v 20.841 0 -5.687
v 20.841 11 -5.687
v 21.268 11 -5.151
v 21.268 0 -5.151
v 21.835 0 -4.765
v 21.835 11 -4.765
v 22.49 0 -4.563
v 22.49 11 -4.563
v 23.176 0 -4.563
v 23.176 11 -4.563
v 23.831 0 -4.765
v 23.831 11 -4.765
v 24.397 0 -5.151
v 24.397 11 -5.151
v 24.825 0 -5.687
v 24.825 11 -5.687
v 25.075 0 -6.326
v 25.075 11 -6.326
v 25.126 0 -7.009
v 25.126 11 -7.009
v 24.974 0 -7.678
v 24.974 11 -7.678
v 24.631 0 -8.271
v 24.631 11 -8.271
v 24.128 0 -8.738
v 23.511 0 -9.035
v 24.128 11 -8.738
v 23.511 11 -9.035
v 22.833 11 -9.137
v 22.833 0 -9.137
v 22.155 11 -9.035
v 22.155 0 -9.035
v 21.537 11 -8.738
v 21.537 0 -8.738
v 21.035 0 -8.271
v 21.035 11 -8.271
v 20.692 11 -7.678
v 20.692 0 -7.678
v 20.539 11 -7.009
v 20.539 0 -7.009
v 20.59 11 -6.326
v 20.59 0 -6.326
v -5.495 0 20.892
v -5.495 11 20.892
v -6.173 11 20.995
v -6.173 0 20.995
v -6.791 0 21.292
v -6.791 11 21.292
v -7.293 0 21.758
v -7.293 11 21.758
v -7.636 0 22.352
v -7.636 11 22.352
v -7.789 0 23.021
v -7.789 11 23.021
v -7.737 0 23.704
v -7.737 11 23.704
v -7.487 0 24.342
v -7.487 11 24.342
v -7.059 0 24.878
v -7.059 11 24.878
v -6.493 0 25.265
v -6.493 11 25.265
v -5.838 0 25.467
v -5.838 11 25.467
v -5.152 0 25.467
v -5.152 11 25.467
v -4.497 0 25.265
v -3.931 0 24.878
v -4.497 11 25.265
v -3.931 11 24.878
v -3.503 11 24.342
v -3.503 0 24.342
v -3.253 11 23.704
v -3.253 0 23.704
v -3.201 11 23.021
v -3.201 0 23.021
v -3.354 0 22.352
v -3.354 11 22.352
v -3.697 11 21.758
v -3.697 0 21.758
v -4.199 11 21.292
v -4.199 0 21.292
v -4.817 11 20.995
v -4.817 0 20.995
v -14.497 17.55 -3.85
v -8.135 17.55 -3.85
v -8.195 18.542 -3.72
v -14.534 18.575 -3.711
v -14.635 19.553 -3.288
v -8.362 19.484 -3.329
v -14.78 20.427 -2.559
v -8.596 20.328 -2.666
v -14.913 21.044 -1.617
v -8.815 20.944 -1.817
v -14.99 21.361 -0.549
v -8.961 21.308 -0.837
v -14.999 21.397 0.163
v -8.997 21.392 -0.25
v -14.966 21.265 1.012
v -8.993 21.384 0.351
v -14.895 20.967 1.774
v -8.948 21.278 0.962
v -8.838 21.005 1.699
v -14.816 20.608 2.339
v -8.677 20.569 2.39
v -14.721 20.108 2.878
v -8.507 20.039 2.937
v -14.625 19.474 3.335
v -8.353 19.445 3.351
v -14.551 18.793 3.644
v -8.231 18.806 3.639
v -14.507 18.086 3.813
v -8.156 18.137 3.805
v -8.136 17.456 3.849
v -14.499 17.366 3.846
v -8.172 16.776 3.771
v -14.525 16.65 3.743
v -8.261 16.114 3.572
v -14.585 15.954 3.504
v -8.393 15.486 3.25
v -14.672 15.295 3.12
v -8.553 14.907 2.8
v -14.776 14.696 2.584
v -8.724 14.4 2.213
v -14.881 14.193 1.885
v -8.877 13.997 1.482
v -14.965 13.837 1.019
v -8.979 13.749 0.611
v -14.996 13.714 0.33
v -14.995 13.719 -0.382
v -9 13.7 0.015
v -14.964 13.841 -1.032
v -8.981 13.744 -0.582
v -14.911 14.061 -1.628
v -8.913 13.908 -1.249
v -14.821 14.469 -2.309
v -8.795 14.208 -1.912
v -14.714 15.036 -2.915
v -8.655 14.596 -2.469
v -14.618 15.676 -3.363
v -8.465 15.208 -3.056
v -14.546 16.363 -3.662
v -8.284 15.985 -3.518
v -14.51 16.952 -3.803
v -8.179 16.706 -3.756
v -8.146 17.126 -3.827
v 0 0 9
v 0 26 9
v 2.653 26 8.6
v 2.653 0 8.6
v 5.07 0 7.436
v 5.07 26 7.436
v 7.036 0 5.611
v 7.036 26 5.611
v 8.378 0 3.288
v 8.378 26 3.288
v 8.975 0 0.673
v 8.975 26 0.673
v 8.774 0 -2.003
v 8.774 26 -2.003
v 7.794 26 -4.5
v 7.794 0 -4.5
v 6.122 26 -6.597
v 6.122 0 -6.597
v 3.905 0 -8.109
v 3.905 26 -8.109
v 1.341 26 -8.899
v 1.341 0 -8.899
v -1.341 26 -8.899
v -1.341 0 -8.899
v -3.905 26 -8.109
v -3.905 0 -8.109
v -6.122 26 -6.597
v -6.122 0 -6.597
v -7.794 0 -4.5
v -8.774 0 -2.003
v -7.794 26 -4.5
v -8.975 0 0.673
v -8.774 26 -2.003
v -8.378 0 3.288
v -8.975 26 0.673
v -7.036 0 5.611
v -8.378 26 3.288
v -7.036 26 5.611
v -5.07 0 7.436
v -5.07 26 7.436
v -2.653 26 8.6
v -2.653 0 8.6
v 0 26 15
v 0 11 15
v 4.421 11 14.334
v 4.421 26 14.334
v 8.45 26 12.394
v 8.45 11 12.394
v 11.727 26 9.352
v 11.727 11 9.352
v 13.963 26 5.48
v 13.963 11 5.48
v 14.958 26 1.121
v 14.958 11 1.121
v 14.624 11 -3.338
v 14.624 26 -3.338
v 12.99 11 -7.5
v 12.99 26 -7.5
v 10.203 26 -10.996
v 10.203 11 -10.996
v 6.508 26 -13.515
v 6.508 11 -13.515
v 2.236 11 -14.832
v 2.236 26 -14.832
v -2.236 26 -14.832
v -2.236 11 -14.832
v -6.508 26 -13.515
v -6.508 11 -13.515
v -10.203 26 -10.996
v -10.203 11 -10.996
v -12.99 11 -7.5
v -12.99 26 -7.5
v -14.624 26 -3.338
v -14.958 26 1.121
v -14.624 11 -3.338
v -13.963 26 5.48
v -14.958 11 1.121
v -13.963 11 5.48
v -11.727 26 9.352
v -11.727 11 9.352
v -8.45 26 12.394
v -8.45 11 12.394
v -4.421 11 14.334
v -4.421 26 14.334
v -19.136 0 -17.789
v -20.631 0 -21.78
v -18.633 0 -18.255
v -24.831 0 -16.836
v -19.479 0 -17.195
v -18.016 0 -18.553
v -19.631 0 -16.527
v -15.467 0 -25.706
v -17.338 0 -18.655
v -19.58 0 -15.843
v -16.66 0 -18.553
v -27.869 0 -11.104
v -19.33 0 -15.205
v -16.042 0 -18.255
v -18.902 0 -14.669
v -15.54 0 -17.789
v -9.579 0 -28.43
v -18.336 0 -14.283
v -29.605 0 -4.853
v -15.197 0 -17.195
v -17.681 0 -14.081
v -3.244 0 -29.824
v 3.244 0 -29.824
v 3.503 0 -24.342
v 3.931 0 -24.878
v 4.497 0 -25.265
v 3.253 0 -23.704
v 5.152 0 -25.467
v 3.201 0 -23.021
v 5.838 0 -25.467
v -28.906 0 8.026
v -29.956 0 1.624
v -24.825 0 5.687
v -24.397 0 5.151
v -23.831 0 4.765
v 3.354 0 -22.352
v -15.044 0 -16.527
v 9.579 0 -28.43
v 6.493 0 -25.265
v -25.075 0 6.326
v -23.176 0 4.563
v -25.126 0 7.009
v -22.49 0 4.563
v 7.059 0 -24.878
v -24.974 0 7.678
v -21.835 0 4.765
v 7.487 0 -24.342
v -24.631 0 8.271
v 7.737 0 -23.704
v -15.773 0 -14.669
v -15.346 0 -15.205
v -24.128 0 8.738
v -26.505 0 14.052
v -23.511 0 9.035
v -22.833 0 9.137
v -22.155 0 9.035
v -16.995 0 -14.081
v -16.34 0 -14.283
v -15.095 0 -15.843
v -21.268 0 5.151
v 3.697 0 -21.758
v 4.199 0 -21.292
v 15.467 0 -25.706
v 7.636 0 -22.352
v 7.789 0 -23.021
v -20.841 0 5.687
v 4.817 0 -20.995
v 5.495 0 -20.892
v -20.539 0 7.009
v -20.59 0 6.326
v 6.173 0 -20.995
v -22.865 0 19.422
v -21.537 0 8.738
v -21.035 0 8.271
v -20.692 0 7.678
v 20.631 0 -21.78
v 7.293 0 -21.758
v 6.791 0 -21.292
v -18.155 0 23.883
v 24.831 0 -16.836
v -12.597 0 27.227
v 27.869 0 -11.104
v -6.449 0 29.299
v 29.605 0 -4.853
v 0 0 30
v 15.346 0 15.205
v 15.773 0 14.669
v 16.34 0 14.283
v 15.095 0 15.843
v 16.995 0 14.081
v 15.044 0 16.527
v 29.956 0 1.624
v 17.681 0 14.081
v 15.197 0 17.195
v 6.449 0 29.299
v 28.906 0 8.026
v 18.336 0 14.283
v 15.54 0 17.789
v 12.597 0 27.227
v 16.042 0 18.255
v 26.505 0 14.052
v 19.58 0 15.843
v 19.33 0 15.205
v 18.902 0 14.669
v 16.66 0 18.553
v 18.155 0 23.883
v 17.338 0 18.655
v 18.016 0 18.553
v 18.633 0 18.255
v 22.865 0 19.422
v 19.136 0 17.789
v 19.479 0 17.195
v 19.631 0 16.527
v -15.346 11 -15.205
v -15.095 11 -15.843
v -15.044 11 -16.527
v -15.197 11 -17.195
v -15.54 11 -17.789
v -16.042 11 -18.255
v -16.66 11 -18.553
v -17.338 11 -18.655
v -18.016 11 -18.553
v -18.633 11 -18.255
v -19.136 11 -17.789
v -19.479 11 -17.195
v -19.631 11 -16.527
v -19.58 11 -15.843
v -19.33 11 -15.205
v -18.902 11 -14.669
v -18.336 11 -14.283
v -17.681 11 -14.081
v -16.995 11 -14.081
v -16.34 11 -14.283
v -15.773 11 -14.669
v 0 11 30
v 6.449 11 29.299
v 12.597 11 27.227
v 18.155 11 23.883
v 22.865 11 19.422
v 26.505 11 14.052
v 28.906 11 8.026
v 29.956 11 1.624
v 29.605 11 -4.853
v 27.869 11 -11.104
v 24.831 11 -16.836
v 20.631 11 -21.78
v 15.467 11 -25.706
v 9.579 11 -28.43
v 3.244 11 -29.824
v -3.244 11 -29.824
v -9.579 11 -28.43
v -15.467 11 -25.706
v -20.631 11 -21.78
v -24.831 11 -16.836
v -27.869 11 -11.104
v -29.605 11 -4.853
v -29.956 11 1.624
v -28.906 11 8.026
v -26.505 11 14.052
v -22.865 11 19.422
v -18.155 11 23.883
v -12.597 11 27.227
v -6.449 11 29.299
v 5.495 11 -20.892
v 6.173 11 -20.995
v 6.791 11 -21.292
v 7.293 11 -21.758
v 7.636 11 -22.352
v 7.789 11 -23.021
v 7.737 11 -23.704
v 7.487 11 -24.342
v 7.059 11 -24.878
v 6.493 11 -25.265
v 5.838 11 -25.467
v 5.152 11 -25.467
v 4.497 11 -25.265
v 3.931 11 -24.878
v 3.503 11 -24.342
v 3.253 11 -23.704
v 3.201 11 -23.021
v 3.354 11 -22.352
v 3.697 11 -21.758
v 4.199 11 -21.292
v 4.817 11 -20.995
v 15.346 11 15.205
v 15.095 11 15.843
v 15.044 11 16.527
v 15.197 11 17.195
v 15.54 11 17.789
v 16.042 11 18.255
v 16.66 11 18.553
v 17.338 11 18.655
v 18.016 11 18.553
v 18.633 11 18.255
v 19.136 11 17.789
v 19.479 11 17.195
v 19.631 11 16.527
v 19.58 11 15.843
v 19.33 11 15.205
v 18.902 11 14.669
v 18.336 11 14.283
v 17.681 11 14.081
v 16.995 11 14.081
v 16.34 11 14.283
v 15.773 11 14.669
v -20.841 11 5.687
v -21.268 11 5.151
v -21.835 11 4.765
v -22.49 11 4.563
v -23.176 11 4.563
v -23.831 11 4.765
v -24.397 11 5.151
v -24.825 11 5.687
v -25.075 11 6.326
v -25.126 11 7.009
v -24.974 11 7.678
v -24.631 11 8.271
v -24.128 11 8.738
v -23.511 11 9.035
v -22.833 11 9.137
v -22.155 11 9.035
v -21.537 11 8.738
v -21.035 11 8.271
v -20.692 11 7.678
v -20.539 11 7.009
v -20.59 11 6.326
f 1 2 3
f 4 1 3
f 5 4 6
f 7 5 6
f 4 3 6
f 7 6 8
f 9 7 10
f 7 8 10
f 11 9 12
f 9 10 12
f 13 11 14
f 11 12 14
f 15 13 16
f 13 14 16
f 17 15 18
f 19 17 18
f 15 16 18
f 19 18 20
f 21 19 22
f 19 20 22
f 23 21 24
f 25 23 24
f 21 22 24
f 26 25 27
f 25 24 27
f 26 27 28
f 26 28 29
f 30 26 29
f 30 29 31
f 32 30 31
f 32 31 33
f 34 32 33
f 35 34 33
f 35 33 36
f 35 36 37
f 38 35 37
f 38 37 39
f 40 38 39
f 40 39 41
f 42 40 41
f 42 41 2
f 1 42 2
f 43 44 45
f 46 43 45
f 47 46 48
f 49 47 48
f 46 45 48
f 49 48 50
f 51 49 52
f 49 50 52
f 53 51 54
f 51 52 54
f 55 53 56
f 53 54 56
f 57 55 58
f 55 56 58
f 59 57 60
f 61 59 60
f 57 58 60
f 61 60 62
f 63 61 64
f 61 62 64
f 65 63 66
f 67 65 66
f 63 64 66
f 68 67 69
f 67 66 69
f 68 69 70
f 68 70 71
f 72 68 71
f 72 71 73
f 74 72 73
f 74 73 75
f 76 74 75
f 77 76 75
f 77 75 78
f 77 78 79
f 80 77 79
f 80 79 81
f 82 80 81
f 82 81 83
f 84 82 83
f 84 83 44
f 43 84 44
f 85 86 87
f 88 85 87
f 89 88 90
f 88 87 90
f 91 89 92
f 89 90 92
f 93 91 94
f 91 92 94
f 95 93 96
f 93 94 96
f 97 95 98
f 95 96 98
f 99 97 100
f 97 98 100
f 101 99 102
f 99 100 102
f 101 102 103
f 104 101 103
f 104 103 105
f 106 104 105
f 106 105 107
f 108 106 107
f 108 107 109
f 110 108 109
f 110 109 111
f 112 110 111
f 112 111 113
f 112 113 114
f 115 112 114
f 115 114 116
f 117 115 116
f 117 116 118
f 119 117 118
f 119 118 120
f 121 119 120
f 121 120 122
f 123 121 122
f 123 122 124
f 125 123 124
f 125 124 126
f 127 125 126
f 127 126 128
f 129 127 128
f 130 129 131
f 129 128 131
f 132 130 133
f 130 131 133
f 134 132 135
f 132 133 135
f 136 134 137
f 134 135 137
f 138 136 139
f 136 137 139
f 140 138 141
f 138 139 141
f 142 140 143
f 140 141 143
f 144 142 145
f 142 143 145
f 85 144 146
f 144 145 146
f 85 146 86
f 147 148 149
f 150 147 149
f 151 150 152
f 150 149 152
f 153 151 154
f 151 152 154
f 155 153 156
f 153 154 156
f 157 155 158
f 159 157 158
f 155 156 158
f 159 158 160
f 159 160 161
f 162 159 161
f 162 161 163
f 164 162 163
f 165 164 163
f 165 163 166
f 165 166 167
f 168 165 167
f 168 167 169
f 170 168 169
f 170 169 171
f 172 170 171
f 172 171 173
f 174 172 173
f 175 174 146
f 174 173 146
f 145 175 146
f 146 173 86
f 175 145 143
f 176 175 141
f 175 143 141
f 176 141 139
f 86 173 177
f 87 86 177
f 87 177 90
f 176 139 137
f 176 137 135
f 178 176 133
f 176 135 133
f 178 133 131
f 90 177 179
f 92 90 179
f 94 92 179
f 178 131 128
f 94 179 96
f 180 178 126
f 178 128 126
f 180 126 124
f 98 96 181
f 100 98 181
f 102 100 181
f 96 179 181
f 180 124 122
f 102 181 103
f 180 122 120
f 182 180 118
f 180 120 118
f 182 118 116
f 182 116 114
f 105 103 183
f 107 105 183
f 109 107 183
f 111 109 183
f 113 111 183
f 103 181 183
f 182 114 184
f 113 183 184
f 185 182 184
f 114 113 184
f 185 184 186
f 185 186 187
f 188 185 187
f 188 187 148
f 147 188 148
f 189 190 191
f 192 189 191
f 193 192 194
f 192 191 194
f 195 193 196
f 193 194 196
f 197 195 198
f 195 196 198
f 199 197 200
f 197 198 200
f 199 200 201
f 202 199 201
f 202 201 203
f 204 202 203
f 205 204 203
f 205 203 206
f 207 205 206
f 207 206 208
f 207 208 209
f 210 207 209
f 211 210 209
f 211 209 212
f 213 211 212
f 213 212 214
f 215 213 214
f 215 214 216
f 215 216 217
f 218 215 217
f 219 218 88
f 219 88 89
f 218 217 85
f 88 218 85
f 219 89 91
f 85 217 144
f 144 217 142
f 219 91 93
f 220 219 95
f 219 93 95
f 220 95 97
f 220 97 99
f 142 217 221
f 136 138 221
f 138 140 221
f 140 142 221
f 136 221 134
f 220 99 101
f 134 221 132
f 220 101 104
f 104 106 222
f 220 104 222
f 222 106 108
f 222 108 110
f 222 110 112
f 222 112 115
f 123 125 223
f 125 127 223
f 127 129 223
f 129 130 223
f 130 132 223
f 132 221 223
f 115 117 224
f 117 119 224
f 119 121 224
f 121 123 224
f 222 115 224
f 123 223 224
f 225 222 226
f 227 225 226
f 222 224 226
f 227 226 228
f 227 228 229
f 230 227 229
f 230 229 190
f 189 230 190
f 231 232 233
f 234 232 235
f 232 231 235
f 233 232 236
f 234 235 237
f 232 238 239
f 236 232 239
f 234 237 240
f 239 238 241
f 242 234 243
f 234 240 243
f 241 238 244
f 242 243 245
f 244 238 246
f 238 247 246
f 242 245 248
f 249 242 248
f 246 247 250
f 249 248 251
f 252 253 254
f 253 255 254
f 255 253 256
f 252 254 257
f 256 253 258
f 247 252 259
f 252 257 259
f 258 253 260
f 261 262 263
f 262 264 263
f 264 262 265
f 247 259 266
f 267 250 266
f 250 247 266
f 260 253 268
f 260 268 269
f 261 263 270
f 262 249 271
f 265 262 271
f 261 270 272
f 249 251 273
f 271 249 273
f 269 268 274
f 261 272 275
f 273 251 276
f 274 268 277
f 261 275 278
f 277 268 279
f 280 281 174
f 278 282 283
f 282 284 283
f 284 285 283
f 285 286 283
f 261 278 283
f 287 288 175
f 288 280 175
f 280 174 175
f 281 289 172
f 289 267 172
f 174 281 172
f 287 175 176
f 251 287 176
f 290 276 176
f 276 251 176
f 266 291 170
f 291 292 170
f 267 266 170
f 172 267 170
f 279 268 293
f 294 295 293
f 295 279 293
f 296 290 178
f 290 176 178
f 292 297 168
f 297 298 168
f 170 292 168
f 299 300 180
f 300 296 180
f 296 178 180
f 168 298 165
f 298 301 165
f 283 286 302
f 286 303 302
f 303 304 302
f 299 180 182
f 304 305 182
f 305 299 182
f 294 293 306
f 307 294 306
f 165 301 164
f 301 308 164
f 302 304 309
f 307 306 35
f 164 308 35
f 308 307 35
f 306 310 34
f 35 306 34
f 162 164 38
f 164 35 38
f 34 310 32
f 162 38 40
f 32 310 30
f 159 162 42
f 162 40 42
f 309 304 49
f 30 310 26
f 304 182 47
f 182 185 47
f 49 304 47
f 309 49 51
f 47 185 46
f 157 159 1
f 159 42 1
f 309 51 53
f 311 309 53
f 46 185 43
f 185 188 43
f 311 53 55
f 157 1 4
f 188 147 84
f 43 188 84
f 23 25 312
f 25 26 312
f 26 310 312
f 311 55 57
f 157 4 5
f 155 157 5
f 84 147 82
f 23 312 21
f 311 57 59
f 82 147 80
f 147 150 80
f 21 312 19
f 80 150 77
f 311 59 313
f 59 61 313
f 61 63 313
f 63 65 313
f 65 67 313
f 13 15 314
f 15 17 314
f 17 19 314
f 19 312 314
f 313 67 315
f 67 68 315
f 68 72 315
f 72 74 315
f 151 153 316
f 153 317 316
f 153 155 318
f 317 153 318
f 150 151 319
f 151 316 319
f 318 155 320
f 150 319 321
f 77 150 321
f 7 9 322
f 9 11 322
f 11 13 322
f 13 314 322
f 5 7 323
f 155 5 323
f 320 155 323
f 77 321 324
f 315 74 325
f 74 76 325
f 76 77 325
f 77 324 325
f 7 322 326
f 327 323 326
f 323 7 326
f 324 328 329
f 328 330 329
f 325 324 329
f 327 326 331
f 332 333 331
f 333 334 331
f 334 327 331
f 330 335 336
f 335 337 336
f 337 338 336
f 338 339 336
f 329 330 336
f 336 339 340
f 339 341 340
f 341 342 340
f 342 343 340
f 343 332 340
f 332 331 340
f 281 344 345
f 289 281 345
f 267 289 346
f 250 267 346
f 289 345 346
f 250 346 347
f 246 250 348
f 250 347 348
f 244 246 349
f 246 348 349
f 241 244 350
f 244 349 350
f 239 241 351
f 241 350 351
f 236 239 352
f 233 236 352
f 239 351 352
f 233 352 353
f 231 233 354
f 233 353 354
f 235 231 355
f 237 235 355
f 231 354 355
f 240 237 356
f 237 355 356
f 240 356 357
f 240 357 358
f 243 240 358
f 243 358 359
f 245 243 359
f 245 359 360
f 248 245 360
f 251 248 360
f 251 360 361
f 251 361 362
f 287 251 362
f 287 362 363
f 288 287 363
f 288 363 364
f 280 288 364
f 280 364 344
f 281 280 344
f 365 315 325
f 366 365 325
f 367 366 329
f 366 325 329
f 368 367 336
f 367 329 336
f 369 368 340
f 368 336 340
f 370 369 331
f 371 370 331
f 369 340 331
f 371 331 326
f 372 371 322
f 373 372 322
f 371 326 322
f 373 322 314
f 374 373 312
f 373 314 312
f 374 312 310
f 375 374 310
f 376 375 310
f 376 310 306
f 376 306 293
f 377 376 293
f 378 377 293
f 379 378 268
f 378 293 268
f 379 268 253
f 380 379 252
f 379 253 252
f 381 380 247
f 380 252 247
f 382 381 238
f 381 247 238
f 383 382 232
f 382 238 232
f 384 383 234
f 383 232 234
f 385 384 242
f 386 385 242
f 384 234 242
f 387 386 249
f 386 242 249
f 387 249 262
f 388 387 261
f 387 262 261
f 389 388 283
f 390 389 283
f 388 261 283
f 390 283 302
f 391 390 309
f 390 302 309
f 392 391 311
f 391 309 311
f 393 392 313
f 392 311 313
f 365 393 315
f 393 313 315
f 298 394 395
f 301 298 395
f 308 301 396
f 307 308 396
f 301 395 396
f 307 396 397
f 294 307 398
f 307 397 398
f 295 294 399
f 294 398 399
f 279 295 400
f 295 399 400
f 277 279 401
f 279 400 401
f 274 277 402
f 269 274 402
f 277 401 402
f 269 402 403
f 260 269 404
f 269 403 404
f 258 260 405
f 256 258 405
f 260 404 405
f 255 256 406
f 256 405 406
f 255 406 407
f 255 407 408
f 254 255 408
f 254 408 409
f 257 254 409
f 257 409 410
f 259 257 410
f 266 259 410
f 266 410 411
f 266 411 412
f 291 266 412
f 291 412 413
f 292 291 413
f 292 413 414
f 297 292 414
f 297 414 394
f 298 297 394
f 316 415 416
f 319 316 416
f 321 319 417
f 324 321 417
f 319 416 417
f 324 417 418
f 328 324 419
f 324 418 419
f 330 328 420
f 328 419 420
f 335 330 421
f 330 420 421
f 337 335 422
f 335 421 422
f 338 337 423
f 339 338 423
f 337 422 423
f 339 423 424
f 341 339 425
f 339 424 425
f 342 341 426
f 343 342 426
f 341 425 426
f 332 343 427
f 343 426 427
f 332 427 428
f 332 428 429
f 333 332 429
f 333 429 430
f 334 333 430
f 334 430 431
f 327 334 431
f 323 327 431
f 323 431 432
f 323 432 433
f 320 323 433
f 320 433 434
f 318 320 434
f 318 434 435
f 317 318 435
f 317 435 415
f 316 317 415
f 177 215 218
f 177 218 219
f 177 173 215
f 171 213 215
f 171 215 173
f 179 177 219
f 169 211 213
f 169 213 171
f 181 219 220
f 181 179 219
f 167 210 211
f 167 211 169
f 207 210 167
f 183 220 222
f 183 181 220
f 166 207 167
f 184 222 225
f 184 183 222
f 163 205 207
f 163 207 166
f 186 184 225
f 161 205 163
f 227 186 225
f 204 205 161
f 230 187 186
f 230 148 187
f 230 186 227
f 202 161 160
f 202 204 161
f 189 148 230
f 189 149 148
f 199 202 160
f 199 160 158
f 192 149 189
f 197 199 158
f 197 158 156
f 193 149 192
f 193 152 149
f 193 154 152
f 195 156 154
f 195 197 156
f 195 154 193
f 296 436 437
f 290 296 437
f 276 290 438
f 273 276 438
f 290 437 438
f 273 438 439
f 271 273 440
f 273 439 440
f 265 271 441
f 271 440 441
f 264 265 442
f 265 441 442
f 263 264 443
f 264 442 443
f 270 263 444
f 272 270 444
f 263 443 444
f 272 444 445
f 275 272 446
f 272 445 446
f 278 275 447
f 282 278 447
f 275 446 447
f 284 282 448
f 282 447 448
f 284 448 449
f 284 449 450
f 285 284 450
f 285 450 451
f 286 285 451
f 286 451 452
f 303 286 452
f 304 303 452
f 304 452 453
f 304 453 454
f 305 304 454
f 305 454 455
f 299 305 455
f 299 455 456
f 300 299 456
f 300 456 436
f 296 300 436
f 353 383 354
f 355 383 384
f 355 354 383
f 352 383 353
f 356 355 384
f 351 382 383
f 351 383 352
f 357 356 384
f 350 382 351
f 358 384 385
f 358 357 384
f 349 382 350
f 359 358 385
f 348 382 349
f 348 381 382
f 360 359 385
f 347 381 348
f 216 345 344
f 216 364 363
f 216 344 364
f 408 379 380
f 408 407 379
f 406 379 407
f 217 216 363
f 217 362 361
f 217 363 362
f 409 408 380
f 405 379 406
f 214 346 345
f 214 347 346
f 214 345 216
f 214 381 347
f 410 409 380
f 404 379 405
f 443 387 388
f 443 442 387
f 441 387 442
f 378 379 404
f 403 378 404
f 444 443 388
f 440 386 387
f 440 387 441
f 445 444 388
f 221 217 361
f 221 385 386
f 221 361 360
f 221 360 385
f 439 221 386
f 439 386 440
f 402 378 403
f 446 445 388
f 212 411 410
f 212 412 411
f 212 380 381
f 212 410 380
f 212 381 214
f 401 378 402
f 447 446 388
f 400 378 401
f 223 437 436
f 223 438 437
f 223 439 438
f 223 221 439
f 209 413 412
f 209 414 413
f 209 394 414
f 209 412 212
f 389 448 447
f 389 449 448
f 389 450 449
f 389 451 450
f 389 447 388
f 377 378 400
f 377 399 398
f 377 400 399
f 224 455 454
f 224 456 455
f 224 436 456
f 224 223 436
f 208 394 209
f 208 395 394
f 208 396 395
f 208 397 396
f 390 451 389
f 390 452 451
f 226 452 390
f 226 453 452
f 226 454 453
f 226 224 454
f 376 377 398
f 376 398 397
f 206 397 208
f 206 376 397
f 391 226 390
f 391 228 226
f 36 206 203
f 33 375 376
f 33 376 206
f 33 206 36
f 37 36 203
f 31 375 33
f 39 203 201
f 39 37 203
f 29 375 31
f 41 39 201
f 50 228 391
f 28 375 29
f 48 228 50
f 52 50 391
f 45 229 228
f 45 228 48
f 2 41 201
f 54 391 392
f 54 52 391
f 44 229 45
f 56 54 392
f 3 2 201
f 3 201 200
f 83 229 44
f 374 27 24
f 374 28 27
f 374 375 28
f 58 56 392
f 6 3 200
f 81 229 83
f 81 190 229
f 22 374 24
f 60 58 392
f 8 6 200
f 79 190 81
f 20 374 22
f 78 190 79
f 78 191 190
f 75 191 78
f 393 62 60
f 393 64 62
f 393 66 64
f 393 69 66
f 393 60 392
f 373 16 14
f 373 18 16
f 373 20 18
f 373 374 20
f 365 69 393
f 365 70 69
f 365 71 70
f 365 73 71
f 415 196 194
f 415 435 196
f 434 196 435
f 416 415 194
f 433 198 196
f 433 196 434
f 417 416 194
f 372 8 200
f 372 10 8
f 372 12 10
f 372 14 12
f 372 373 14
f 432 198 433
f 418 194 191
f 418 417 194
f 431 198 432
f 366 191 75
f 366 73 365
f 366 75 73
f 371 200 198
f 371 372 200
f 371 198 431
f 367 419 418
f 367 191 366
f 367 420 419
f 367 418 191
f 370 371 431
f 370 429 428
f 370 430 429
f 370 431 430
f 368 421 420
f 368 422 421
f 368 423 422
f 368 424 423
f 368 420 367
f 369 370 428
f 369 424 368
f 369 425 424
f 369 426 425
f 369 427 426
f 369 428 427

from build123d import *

# Parameters (mm, degrees)
SKETCH2_R               = 15
BOSS_EXTRUDE1_DEPTH     = 26
SKETCH1_R               = 30
BOSS_EXTRUDE2_DEPTH     = 11
SKETCH3_R               = 9
CUT_EXTRUDE1_DEPTH      = 50.759421218
SKETCH4_R               = 2.3
CUT_EXTRUDE2_DEPTH      = 46
CIRPATTERN1_COUNT       = 6
CUT_EXTRUDE3_REACH      = 51.759
CUT_EXTRUDE3_END_RADIUS = 15
SKETCH7_R               = 3.85


with BuildPart() as part:
    # Sketch2 → Boss-Extrude1 (new body)
    with BuildSketch(Plane(origin=(0, 0, 0), x_dir=(1, 0, 0), z_dir=(0, 1, 0))):
        with Locations(Location((0, 0, 0), (0, 0, 270))):
            Circle(SKETCH2_R)
    extrude(amount=BOSS_EXTRUDE1_DEPTH)

    # Sketch1 → Boss-Extrude2 (add)
    with BuildSketch(Plane(origin=(0, 0, 0), x_dir=(1, 0, 0), z_dir=(0, 1, 0))):
        with Locations(Location((0, 0, 0), (0, 0, 270))):
            Circle(SKETCH1_R)
    extrude(amount=BOSS_EXTRUDE2_DEPTH)

    # Sketch3 → Cut-Extrude1 (cut, through all)
    with BuildSketch(Plane(origin=(0, 26, 0), x_dir=(1, 0, 0), z_dir=(0, 1, 0))):
        with Locations(Location((0, 0, 0), (0, 0, 270))):
            Circle(SKETCH3_R)
    extrude(amount=-CUT_EXTRUDE1_DEPTH, mode=Mode.SUBTRACT)

    # Sketch4 → Cut-Extrude2 (cut, through all)
    with BuildSketch(Plane(origin=(0, 11, 0), x_dir=(1, 0, 0), z_dir=(0, 1, 0))):
        with Locations(Location((5.495034326, 23.192449843, 0), (0, 0, 270))):
            Circle(SKETCH4_R)
    cut_extrude2 = extrude(amount=-CUT_EXTRUDE2_DEPTH, mode=Mode.SUBTRACT)

    # CirPattern1: Cut-Extrude2 ×6 about axis
    cirpattern1_axis = Axis((0, 0, 0), (0, 1, 0))
    for i in range(1, CIRPATTERN1_COUNT):
        add(cut_extrude2.rotate(cirpattern1_axis, i * 360 / CIRPATTERN1_COUNT), mode=Mode.SUBTRACT)

    # Cut-Extrude3: up to this cylinder (the profile starts inside it)
    cut_extrude3_end = Plane(origin=(0, 17.55, 0), z_dir=(0, -1, 0)) * Cylinder(CUT_EXTRUDE3_END_RADIUS, 134.518, mode=Mode.PRIVATE)
    # Sketch7 → Cut-Extrude3 (cut, up to the surface)
    with BuildSketch(Plane(origin=(0, 0, 0), x_dir=(0, 0, -1), z_dir=(1, 0, 0)), mode=Mode.PRIVATE) as cut_extrude3_sk1:
        with Locations((0, 17.55)):
            Circle(SKETCH7_R)
    cut_extrude3_tool1 = extrude(cut_extrude3_sk1.sketch, amount=-CUT_EXTRUDE3_REACH, mode=Mode.PRIVATE) & cut_extrude3_end
    add(cut_extrude3_tool1.solids().sort_by_distance((0, 17.55, 0))[0], mode=Mode.SUBTRACT)


solid = part.part
